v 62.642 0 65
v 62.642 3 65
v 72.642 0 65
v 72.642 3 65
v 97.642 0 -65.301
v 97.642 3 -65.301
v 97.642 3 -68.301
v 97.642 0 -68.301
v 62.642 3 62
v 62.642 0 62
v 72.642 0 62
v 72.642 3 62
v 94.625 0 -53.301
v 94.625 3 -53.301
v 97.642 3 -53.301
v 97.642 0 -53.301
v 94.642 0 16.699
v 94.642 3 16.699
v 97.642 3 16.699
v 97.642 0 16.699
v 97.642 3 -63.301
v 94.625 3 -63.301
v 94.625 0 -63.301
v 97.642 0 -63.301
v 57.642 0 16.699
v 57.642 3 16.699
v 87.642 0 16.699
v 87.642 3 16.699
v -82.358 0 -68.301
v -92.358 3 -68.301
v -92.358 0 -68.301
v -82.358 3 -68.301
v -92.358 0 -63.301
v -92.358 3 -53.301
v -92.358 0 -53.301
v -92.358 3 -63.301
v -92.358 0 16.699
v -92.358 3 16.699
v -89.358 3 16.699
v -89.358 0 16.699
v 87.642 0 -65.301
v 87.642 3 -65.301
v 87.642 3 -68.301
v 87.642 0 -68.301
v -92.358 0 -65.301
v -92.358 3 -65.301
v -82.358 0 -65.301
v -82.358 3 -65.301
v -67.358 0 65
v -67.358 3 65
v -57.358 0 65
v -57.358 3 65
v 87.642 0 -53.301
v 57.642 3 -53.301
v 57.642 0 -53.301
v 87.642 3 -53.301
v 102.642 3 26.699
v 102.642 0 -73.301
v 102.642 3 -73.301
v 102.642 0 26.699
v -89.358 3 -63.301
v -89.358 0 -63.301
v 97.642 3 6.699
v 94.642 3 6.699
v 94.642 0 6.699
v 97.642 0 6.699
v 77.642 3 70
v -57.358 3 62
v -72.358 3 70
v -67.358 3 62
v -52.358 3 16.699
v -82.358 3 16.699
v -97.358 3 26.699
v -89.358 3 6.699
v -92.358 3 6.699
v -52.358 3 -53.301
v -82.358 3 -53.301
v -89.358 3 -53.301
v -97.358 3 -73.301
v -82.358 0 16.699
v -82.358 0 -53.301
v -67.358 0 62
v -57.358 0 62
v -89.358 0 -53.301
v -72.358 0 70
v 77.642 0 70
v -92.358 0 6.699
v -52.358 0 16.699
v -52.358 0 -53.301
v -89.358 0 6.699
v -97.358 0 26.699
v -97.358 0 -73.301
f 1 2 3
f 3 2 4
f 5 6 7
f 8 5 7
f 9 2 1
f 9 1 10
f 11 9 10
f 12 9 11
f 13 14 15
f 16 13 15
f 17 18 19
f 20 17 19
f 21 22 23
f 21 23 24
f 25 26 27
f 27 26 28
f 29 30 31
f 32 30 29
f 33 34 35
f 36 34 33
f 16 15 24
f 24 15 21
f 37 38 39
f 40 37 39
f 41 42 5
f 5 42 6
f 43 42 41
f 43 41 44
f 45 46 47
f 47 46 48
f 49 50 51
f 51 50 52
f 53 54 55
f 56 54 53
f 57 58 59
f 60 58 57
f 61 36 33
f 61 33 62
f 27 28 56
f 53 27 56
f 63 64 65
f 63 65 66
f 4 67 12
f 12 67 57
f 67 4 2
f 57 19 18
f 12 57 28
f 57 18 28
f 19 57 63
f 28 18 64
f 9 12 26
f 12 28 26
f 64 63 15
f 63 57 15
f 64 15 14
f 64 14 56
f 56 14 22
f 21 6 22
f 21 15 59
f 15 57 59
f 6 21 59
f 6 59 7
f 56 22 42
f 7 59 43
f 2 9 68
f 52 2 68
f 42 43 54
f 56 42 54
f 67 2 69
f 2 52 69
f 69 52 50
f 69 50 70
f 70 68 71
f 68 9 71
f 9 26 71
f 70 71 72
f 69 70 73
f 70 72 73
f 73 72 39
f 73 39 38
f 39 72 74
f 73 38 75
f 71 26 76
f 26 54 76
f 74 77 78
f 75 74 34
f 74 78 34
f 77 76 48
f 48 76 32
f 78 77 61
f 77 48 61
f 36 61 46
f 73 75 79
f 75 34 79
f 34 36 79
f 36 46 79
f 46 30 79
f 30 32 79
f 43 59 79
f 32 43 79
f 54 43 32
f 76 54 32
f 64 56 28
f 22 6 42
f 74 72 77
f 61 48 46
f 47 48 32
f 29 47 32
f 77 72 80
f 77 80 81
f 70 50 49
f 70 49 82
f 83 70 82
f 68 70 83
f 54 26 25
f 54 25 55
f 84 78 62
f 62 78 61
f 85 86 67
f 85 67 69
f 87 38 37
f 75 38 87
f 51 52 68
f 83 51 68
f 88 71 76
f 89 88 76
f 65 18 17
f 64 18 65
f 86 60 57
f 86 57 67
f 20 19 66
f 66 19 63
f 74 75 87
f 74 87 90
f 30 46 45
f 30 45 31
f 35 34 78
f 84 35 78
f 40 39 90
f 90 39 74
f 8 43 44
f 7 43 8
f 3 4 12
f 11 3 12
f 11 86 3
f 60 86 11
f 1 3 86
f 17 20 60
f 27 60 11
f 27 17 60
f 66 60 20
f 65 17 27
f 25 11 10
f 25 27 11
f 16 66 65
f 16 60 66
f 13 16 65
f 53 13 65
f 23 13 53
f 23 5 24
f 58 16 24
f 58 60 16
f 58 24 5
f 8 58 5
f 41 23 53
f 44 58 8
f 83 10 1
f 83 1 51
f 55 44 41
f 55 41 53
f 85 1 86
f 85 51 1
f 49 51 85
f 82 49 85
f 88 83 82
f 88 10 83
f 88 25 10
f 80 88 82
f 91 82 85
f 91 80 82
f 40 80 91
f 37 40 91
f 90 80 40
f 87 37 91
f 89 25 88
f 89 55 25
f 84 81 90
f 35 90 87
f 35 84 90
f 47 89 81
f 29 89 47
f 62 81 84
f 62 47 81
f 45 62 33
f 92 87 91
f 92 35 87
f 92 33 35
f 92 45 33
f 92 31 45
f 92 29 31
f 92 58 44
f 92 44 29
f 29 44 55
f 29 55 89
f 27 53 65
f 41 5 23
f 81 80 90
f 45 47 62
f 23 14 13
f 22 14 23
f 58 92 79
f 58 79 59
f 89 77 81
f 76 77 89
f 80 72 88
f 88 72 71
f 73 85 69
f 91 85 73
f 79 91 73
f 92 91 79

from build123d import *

# Parameters (mm, degrees)
RESSALTO_EXTRUS_O1_DEPTH = 3
ESBO_O3_W                = 10
ESBO_O3_H                = 3
ESBO_O3_W_2              = 3
ESBO_O3_H_2              = 10
ESBO_O3_W_3              = 3.017337907
CORTE_EXTRUS_O1_DEPTH    = 3
ESBO_O4_W                = 30
ESBO_O4_H                = 70
CORTE_EXTRUS_O2_DEPTH    = 3


with BuildPart() as part:
    # Esboço1 → Ressalto-extrusão1 (new body)
    with BuildSketch(Plane(origin=(0, 0, 0), x_dir=(1, 0, 0), z_dir=(0, 1, 0))):
        Polygon((-97.357643635, -26.698729811), (-97.357643635, 73.301270189), (102.642356365, 73.301270189), (102.642356365, -26.698729811), (77.642356365, -70), (-72.357643635, -70), align=None)
    extrude(amount=RESSALTO_EXTRUS_O1_DEPTH)

    # Esboço3 → Corte-extrusão1 (cut)
    with BuildSketch(Plane(origin=(0, 3, 0), x_dir=(1, 0, 0), z_dir=(0, 1, 0))):
        with Locations((-62.357643635, -63.5)):
            Rectangle(ESBO_O3_W, ESBO_O3_H)
        with Locations((67.642356365, -63.5)):
            Rectangle(ESBO_O3_W, ESBO_O3_H)
        with Locations((96.142356365, -11.698729811)):
            Rectangle(ESBO_O3_W_2, ESBO_O3_H_2)
        with Locations((96.133687412, 58.301270189)):
            Rectangle(ESBO_O3_W_3, ESBO_O3_H_2)
        with Locations((92.642356365, 66.801270189)):
            Rectangle(ESBO_O3_W, ESBO_O3_H)
        with Locations((-90.857643635, -11.698729811)):
            Rectangle(ESBO_O3_W_2, ESBO_O3_H_2)
        with Locations((-90.857643635, 58.301270189)):
            Rectangle(ESBO_O3_W_2, ESBO_O3_H_2)
        with Locations((-87.357643635, 66.801270189)):
            Rectangle(ESBO_O3_W, ESBO_O3_H)
    extrude(amount=-CORTE_EXTRUS_O1_DEPTH, mode=Mode.SUBTRACT)

    # Esboço4 → Corte-extrusão2 (cut)
    with BuildSketch(Plane(origin=(0, 3, 0), x_dir=(1, 0, 0), z_dir=(0, 1, 0))):
        with Locations((-67.357643635, 18.301270189)):
            Rectangle(ESBO_O4_W, ESBO_O4_H)
        with Locations((72.642356365, 18.301270189)):
            Rectangle(ESBO_O4_W, ESBO_O4_H)
    extrude(amount=-CORTE_EXTRUS_O2_DEPTH, mode=Mode.SUBTRACT)


solid = part.part
